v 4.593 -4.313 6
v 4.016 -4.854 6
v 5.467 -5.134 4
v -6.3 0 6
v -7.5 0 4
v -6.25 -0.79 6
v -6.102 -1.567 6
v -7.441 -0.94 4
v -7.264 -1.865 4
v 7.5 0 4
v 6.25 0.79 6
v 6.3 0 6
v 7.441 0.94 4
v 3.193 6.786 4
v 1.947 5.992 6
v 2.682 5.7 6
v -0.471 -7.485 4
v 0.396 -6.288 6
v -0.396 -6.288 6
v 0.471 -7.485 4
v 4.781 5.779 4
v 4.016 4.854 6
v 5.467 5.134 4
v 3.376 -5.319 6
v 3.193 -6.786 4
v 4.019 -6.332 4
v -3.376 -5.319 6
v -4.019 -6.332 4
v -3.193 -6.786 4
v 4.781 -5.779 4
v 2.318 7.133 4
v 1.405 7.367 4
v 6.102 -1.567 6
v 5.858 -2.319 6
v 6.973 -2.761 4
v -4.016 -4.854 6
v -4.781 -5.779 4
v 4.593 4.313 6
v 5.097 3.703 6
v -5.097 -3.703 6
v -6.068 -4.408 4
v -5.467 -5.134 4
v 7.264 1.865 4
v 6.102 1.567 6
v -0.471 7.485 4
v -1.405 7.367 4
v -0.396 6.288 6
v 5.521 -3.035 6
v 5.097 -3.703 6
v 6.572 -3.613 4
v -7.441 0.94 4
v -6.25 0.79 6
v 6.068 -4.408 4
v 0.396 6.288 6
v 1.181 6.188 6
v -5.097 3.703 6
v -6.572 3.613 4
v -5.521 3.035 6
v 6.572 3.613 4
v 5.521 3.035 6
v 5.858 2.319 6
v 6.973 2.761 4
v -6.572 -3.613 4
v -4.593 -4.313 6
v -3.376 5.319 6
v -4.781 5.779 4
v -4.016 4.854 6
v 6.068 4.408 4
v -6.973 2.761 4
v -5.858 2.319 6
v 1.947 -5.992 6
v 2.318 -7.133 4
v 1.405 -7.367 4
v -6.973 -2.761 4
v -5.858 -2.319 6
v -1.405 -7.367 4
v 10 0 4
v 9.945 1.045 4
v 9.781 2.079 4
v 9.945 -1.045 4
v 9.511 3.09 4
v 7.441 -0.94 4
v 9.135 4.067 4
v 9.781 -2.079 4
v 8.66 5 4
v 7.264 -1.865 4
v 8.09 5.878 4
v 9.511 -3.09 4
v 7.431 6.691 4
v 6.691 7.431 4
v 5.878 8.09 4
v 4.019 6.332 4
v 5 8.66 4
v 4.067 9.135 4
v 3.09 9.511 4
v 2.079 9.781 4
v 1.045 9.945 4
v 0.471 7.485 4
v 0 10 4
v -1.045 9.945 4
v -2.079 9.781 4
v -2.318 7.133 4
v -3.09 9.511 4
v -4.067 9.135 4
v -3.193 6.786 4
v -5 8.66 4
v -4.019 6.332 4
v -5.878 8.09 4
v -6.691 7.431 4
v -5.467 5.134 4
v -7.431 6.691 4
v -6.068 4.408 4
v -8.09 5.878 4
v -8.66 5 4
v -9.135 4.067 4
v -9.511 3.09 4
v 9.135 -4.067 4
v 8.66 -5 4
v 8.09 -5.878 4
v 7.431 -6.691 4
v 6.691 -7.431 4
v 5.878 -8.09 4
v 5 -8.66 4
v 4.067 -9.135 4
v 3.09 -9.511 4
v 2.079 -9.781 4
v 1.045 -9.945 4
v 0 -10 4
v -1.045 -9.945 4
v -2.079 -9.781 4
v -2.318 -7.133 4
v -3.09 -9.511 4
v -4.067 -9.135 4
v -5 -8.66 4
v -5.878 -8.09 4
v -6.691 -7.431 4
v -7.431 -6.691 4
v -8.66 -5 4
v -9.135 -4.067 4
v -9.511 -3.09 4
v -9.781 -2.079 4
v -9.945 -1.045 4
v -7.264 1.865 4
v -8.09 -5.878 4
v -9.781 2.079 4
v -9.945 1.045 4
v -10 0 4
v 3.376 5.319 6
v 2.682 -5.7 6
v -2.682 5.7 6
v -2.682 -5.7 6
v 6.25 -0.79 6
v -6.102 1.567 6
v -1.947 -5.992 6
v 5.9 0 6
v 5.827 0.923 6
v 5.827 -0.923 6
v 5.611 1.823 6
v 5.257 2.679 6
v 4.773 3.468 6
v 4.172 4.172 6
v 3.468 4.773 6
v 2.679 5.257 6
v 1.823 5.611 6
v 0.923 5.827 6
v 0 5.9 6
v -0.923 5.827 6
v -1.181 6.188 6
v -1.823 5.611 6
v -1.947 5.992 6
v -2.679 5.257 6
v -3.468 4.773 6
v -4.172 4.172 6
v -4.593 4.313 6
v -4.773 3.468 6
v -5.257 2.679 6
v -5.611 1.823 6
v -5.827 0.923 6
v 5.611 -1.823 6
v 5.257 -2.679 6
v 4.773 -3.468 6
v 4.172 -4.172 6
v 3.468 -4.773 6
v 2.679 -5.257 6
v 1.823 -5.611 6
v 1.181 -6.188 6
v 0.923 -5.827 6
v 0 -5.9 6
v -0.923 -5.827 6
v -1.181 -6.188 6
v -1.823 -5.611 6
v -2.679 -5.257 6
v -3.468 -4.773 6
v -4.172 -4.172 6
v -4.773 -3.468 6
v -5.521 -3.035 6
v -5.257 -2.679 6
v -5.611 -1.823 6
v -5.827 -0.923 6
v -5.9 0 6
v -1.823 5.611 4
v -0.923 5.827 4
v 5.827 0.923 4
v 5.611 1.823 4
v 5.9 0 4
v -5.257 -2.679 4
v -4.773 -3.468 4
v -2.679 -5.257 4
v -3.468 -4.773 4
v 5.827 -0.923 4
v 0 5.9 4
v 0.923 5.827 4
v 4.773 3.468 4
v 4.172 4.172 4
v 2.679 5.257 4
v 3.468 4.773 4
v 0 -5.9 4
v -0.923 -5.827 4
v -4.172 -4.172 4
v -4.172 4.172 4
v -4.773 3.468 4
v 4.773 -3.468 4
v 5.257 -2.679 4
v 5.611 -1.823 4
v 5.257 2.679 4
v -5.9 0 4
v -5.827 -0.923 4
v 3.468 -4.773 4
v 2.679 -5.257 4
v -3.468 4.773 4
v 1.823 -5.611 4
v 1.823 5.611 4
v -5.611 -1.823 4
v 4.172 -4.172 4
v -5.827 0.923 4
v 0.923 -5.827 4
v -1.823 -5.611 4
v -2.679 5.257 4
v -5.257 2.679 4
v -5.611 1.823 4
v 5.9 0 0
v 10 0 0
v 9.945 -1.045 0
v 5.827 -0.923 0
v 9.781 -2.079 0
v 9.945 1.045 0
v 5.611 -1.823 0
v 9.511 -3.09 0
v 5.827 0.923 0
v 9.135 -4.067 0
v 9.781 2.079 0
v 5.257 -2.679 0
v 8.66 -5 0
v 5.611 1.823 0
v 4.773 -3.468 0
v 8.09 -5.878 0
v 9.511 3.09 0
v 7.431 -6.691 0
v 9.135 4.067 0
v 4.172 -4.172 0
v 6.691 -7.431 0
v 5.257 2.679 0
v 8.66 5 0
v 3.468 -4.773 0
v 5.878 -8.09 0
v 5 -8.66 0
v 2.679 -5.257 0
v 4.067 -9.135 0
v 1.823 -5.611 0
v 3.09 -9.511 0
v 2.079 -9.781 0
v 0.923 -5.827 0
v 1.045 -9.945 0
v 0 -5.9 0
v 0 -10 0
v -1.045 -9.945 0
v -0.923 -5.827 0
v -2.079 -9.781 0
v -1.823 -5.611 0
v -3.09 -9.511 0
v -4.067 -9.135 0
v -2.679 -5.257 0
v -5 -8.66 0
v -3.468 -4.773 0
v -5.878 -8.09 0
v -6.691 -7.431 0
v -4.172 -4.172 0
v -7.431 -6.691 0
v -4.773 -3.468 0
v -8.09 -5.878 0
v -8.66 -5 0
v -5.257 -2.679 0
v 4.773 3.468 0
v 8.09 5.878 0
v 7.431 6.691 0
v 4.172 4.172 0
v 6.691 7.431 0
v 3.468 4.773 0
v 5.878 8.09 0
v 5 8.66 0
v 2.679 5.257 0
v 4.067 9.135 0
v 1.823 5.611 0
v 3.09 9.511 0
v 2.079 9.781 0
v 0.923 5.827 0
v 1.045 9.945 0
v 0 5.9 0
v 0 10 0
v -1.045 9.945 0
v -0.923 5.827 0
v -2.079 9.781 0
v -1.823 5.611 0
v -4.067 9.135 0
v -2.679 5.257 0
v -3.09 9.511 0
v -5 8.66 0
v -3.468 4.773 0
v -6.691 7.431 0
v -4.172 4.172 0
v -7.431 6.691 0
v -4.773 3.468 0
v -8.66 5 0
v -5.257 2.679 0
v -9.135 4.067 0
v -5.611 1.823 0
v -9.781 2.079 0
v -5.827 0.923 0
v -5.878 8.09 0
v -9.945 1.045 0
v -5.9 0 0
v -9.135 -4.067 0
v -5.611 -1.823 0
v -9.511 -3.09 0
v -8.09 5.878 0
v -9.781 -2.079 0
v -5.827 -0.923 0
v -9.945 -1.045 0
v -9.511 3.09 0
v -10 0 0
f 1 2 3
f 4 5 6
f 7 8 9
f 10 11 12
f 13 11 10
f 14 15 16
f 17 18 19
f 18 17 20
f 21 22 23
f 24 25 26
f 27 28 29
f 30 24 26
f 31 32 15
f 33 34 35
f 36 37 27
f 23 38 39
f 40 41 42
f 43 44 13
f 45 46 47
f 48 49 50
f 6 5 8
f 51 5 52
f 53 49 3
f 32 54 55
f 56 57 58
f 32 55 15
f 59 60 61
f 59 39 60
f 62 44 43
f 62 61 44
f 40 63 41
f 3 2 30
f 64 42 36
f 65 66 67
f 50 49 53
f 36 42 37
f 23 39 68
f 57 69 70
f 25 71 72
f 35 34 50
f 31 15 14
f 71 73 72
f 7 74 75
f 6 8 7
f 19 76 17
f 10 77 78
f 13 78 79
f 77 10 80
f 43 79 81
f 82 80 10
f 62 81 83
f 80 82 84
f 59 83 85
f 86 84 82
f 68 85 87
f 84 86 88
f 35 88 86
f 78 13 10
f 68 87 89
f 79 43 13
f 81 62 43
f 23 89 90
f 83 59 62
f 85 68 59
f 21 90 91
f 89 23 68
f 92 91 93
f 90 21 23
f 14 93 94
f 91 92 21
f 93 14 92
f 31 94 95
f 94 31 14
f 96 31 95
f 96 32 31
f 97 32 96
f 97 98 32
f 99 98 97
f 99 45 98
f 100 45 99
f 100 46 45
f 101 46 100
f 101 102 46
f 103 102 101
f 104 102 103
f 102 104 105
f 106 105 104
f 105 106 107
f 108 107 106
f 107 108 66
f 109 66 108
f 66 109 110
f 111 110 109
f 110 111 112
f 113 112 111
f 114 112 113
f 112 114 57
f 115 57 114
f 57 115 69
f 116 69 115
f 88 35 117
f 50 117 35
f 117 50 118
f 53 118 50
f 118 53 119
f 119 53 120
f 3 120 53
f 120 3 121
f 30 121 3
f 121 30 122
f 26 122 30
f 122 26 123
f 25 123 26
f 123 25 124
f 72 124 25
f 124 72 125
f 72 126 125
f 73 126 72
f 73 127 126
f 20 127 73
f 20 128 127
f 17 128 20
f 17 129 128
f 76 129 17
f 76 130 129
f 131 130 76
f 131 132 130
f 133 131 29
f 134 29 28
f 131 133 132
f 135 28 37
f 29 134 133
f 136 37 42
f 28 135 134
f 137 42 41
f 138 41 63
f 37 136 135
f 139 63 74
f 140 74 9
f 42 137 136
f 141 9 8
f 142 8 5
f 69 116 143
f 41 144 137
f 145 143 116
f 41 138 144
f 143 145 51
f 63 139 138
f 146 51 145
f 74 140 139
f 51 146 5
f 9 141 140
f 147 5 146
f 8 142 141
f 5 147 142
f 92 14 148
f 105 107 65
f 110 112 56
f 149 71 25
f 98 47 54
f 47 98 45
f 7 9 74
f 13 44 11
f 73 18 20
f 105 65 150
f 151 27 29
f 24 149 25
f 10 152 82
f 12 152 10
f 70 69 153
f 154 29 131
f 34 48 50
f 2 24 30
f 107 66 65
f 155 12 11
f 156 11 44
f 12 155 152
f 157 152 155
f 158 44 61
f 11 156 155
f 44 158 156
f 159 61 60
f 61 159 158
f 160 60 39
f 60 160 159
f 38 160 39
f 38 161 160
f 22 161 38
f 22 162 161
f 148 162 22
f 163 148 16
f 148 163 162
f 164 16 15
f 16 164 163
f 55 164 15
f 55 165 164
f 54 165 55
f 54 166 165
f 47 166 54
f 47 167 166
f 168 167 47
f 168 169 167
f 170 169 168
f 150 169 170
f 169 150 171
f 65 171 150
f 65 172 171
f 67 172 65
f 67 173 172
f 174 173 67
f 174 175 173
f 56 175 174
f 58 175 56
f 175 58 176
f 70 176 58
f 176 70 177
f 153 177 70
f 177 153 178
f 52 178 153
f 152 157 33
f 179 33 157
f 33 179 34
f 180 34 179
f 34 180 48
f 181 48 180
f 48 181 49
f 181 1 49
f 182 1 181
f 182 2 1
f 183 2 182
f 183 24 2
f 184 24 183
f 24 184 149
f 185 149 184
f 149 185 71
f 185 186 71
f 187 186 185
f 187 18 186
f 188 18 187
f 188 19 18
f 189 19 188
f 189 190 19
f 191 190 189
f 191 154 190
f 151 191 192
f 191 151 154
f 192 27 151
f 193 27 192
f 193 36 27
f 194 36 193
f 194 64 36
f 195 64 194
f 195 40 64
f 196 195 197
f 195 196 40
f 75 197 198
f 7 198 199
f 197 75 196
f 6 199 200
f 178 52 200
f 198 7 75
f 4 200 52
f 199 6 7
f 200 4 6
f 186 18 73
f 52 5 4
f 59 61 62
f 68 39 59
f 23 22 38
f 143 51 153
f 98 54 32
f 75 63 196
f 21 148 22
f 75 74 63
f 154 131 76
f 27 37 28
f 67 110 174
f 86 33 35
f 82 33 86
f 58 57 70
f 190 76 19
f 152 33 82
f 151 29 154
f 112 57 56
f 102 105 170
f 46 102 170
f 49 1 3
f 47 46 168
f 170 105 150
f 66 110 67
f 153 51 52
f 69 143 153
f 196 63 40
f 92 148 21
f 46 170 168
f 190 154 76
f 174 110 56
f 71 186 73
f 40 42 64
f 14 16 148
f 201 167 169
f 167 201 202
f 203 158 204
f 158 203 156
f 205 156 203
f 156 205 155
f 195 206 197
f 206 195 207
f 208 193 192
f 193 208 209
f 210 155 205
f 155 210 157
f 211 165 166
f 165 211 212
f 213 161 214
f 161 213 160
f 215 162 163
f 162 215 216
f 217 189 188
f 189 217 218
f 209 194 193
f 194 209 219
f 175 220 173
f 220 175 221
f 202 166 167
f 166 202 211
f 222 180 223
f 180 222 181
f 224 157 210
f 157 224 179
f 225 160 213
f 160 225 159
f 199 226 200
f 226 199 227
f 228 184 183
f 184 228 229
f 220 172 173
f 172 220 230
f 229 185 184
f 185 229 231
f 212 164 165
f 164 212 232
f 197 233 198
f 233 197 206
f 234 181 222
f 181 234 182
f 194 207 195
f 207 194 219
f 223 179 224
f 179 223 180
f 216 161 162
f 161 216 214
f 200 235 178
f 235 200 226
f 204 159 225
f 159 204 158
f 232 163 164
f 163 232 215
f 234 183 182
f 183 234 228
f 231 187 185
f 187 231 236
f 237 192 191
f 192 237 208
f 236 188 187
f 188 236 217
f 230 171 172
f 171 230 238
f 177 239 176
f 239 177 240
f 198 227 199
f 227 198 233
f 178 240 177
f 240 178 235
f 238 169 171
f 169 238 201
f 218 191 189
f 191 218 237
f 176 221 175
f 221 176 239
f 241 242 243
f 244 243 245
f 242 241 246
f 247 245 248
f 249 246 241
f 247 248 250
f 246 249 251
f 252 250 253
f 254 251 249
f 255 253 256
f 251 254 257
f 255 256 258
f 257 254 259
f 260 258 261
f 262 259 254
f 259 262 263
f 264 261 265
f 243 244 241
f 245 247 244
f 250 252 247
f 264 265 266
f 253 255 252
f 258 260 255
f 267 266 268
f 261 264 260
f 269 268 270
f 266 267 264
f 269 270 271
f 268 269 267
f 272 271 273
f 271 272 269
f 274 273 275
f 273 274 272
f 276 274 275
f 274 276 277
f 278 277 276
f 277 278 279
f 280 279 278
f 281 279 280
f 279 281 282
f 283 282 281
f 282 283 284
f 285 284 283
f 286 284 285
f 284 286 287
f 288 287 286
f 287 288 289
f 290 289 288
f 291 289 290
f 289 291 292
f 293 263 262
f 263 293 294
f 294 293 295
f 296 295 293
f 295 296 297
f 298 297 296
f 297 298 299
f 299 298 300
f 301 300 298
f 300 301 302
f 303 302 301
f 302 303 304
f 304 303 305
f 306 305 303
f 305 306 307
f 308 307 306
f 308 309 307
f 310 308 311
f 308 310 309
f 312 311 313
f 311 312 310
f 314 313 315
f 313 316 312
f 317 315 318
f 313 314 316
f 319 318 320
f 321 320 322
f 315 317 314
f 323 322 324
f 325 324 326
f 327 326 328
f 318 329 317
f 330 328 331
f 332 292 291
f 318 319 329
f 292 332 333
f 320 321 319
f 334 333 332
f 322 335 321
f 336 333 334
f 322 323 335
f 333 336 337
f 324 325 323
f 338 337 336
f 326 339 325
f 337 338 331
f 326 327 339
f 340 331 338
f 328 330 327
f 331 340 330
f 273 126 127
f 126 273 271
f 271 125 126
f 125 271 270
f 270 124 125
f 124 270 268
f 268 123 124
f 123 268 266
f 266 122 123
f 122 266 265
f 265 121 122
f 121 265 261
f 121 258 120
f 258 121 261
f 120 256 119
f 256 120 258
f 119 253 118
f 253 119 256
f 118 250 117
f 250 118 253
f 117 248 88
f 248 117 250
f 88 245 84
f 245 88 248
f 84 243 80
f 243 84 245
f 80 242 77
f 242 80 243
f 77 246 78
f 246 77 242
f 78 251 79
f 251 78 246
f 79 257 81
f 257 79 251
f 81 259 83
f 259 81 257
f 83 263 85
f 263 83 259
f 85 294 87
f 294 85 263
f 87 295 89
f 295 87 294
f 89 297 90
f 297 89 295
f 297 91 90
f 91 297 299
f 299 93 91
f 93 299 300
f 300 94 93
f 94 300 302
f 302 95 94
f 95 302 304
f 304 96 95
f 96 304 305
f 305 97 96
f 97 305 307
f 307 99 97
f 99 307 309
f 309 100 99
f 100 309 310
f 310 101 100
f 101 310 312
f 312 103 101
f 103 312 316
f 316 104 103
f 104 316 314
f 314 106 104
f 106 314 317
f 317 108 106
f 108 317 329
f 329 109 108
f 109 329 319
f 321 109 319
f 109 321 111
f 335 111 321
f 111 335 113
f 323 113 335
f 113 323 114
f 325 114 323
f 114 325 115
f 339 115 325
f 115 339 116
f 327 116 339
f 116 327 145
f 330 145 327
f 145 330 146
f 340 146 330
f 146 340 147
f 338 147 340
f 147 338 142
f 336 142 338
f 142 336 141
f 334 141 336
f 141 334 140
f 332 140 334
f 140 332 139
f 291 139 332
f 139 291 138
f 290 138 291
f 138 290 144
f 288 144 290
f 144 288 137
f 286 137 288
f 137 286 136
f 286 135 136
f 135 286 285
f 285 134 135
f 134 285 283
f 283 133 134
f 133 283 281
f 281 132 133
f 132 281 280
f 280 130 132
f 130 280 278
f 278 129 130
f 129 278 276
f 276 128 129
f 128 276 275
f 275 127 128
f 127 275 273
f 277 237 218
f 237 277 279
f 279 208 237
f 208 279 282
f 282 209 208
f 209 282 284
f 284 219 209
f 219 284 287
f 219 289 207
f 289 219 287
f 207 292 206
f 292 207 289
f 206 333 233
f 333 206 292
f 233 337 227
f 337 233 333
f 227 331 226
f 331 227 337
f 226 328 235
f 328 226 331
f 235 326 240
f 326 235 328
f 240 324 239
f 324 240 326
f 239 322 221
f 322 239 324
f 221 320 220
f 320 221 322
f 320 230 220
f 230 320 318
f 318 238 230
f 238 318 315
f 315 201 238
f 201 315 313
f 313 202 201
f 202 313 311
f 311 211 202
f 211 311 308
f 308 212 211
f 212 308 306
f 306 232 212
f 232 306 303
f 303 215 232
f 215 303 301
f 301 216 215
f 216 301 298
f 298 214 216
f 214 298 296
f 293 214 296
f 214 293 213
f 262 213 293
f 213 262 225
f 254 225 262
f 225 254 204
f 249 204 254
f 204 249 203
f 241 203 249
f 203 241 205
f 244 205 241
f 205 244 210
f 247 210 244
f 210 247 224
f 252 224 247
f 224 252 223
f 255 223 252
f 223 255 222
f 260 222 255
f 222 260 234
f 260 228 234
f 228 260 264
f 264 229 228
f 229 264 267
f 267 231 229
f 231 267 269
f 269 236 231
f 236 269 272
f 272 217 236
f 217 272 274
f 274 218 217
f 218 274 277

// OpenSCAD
id=11.8;
od=20;
main_thick=4;
wedge_thick=2;
linear_extrude(main_thick) difference() {
  circle(d=od,$fn=60);
  circle(d=id,$fn=40);
}
difference() {
  translate([0,0,main_thick]) cylinder(d1=id+3.2,d2=id+.8,h=wedge_thick,$fn=50);
  translate([0,0,main_thick-.01]) cylinder(d=id,h=wedge_thick+.02,$fn=40);
}
